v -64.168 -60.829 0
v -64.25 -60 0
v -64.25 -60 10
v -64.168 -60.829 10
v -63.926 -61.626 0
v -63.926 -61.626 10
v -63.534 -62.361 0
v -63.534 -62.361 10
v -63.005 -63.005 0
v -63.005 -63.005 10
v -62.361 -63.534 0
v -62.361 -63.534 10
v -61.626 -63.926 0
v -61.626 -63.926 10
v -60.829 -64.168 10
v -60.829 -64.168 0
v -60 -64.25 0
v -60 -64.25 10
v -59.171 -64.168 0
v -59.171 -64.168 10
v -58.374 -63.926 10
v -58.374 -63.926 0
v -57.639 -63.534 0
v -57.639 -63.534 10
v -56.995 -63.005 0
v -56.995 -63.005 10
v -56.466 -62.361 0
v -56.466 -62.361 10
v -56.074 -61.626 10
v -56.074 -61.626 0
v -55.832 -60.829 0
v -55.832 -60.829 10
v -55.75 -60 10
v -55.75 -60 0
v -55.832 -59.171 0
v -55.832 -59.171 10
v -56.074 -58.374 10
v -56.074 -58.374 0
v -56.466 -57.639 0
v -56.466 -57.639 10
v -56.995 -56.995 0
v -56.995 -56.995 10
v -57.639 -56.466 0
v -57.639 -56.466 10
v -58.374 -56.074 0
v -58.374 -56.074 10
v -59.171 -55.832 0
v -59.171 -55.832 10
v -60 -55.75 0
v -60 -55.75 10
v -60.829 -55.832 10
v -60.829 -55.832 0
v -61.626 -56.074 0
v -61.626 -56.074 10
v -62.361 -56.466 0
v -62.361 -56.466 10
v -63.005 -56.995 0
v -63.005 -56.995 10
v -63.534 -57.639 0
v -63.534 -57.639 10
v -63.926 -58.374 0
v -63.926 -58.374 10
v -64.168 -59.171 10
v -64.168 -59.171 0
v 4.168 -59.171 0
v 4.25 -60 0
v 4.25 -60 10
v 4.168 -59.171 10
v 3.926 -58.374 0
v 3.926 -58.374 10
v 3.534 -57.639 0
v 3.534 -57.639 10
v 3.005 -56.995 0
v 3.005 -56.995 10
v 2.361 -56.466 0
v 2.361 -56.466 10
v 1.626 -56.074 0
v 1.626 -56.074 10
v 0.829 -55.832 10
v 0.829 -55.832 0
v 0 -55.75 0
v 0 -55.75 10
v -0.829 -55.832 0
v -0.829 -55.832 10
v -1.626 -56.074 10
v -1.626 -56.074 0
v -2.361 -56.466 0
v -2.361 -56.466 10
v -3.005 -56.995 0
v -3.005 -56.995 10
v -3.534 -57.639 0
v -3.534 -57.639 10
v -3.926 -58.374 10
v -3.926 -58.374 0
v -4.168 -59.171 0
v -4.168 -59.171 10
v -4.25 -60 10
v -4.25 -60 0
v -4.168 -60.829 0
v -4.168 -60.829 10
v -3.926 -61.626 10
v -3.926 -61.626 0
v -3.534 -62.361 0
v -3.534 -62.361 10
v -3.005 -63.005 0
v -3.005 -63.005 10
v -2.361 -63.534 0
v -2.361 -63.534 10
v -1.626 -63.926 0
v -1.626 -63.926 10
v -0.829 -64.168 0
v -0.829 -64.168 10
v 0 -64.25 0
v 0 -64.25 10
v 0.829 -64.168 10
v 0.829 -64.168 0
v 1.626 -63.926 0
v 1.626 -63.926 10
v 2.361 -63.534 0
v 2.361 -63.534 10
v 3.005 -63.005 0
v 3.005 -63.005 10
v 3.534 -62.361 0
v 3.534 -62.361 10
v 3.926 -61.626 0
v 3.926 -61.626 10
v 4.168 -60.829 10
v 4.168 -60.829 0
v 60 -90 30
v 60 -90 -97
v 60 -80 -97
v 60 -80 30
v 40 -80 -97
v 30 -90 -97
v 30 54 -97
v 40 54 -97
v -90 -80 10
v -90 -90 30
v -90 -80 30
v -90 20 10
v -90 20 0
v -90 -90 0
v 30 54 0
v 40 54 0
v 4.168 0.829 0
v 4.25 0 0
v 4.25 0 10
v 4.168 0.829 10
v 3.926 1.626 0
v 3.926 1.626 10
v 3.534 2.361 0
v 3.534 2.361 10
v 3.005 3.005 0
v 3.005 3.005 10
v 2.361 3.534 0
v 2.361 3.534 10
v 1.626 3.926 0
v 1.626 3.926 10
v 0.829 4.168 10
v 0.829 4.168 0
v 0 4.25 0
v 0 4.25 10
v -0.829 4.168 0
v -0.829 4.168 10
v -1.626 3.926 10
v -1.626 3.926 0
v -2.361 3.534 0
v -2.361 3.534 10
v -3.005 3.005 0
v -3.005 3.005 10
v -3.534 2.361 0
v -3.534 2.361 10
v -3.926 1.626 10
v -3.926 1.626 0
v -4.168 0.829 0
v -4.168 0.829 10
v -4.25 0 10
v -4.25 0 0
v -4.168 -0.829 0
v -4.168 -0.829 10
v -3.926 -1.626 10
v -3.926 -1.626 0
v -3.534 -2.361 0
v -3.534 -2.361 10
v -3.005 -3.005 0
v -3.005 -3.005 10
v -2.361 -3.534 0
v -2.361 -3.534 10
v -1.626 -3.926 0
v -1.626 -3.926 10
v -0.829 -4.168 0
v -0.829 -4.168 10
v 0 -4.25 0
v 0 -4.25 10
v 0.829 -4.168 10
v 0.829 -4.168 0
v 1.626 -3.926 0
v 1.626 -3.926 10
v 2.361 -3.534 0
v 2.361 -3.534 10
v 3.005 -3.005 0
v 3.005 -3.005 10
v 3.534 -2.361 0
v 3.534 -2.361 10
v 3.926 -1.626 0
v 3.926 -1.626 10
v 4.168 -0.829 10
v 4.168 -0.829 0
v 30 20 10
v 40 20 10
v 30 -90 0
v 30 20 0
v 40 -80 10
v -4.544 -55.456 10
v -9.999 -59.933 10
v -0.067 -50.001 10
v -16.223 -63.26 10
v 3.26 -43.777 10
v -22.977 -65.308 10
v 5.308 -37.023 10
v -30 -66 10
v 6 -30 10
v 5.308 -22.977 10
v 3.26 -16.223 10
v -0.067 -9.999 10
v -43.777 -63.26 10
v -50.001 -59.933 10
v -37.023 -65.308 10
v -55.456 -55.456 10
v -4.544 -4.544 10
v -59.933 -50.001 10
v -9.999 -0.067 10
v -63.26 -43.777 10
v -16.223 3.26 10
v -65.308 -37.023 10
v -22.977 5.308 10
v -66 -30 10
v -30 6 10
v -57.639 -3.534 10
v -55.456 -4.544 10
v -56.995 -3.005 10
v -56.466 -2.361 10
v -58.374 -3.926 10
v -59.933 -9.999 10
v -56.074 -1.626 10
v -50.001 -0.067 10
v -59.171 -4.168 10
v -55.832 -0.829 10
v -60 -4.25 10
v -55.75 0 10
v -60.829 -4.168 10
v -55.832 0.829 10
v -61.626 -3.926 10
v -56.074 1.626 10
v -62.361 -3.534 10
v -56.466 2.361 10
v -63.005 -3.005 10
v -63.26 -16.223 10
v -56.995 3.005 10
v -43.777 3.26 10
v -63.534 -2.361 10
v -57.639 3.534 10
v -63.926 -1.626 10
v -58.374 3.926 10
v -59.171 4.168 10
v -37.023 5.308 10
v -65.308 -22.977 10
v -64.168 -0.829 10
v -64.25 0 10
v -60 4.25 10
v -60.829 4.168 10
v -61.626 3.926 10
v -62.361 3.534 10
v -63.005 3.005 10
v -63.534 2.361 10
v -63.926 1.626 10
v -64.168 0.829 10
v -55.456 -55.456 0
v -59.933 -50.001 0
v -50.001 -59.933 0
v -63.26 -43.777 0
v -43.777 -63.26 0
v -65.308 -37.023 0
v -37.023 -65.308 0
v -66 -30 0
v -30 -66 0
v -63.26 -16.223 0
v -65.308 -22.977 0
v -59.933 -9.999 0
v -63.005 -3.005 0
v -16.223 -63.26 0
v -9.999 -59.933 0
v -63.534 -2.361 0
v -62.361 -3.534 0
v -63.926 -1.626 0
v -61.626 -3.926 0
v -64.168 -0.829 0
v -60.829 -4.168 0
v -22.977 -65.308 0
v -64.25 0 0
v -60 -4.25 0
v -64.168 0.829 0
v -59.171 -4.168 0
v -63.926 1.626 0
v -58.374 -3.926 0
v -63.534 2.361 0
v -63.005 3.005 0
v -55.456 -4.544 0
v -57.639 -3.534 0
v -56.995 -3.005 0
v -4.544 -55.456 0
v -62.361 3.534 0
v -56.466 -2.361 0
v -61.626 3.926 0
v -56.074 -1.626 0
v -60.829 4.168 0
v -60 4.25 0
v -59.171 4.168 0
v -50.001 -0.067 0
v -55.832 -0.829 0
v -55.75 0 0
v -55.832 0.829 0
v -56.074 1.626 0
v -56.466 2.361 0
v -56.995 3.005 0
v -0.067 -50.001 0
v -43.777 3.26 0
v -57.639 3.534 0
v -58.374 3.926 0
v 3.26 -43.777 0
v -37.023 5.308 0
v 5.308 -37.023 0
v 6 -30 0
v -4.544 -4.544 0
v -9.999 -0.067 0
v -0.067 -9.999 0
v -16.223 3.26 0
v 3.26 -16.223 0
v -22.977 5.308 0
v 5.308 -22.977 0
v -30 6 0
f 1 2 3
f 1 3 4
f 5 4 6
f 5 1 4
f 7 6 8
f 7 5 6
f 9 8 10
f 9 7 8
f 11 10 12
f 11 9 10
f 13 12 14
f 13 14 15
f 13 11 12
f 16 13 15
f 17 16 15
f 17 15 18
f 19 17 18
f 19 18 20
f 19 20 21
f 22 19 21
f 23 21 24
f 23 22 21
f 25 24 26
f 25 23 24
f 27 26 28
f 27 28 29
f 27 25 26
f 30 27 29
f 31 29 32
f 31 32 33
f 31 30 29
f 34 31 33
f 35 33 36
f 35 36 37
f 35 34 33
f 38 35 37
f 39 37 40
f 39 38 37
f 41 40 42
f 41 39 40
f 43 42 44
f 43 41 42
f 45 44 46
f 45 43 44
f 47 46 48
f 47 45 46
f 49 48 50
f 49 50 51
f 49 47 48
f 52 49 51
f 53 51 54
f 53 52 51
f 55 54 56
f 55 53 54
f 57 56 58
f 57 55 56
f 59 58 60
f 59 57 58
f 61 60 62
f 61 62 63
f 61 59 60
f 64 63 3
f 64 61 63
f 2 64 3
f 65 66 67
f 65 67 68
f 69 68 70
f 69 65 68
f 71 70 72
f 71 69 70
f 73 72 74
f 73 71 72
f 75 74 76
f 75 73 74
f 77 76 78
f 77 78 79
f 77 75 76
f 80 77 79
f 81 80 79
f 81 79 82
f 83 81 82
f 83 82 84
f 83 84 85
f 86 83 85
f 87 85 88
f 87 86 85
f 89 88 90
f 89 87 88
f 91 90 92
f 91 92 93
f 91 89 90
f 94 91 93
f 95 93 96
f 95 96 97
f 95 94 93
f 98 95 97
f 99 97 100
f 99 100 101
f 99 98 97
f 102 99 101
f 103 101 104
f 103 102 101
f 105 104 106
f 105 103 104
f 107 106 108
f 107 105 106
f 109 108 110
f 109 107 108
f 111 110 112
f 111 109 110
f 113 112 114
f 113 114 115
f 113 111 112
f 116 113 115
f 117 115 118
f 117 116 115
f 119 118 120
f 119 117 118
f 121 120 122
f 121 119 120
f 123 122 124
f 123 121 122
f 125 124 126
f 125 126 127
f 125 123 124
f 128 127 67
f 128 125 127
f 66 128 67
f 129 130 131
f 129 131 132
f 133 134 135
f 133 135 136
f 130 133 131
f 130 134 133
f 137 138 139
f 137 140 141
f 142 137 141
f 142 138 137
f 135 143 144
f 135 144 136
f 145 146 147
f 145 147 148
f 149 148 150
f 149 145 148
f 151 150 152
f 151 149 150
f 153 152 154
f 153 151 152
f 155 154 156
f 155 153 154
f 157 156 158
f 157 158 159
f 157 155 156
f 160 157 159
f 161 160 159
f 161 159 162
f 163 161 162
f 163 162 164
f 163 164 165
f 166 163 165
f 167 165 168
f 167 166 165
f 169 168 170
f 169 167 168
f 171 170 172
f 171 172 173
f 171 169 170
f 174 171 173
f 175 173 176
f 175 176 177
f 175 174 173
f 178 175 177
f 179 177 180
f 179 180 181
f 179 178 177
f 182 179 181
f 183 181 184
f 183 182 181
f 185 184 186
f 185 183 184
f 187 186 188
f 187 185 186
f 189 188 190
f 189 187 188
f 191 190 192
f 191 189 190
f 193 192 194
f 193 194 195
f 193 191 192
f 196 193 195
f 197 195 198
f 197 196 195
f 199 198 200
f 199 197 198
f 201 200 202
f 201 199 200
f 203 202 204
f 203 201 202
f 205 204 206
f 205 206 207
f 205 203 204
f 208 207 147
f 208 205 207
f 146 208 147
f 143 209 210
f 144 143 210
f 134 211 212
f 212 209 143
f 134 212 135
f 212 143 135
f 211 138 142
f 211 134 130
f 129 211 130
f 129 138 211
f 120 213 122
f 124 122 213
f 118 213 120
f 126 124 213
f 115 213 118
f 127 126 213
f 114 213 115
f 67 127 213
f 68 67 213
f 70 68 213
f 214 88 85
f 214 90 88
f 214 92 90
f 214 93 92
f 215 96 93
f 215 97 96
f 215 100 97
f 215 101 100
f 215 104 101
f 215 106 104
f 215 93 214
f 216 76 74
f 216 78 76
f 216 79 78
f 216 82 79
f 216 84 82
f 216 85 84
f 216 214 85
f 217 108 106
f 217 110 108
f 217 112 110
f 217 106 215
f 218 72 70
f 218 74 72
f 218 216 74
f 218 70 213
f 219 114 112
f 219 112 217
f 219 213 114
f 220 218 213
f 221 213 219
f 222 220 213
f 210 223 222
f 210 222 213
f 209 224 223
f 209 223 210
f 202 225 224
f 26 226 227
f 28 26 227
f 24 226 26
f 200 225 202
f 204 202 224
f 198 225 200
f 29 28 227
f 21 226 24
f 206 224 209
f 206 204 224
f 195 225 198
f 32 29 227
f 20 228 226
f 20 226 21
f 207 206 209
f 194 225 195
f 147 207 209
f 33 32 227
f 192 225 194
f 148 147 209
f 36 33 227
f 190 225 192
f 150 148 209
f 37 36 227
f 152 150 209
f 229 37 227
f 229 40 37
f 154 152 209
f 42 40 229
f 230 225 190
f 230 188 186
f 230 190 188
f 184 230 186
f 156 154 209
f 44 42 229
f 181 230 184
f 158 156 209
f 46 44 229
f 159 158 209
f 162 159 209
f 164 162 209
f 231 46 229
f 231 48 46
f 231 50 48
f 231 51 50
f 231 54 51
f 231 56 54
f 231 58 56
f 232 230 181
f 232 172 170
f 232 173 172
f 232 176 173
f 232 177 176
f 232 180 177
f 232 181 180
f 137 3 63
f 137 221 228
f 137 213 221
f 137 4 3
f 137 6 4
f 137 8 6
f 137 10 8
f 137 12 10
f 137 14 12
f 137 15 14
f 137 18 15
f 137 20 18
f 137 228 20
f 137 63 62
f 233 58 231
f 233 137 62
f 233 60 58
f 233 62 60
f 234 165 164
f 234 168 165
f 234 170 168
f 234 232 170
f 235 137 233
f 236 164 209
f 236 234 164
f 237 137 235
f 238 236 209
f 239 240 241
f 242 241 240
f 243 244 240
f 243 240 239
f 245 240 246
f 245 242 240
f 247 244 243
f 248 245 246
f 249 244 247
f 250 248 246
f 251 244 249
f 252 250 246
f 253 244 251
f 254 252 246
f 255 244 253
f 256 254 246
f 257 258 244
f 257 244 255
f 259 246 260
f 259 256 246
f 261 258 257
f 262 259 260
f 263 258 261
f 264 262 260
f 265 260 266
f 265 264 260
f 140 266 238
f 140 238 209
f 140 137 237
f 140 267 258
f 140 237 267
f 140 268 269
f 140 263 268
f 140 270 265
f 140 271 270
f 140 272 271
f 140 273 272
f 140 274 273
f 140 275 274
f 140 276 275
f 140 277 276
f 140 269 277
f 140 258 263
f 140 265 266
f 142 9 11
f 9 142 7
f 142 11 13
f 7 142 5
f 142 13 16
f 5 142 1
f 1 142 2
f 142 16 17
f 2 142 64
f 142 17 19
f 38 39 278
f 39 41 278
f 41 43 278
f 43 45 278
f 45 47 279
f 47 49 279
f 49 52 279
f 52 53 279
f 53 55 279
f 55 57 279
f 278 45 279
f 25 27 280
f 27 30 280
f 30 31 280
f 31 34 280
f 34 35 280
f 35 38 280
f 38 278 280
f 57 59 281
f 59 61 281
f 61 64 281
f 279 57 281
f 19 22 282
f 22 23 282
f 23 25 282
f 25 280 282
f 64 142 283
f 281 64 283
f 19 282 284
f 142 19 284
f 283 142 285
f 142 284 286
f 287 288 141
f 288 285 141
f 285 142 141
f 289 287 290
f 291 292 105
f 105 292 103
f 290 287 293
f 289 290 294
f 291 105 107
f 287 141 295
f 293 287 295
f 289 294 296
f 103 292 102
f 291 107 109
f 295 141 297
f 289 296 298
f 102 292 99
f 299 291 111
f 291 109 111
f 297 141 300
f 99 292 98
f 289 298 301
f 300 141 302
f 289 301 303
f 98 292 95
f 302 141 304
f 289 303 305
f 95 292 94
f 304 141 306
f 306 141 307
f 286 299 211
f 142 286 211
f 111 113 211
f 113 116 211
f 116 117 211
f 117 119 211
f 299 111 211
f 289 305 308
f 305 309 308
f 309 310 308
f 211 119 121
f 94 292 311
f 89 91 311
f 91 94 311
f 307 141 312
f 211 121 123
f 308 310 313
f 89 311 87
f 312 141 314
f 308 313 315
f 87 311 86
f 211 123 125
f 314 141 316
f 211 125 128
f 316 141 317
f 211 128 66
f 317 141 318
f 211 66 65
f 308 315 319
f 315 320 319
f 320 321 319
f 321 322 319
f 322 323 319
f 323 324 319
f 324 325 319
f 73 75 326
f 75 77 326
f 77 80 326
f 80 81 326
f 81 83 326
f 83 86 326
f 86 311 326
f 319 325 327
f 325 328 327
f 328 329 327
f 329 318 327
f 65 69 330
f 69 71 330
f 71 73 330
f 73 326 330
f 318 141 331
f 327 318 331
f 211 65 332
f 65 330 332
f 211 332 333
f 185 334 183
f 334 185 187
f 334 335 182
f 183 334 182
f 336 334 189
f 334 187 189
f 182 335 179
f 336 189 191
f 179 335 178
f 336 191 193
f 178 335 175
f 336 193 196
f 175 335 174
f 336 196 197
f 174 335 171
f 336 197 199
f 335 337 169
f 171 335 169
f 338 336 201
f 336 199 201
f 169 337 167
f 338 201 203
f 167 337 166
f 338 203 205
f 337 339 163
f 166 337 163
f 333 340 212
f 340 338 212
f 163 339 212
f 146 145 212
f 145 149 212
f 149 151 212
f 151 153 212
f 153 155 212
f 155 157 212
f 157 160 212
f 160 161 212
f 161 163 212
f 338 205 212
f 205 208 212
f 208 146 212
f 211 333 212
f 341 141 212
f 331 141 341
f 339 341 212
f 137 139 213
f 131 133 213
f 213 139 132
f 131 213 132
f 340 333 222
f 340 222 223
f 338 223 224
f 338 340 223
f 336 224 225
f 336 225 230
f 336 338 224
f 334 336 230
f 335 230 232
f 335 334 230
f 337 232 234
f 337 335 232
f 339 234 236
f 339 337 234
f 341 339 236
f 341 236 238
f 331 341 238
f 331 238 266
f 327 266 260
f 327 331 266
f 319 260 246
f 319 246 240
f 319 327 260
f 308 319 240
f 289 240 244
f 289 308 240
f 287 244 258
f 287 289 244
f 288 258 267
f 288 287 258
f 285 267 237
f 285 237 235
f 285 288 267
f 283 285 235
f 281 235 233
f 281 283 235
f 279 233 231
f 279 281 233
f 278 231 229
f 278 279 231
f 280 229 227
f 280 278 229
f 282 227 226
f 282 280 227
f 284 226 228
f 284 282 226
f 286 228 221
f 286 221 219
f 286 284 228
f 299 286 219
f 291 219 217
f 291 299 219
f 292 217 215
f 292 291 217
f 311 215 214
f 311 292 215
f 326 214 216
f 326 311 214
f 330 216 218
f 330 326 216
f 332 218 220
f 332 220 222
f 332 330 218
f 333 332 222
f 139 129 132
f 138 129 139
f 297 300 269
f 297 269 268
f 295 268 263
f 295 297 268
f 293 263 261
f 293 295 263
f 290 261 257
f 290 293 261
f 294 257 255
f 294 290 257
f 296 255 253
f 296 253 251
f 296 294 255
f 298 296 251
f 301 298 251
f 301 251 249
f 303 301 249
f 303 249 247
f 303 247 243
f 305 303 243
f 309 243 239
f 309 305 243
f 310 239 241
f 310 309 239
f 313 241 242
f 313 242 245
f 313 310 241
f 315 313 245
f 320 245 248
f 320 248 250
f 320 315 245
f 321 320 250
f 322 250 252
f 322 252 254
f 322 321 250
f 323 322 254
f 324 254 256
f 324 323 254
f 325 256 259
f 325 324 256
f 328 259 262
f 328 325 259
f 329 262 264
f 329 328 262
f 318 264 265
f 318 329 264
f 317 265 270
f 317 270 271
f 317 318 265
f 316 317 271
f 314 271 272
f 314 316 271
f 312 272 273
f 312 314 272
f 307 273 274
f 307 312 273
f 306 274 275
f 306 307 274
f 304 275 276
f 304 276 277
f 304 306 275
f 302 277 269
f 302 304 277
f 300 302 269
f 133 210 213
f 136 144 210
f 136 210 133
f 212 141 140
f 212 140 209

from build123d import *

# Parameters (mm, degrees)
SKETCH1_W           = 120
SKETCH1_H           = 110
SKETCH1_R           = 4.25
SKETCH1_R_2         = 36
BOSS_EXTRUDE1_DEPTH = 10
SKETCH2_W           = 107
SKETCH2_H           = 144
BOSS_EXTRUDE2_DEPTH = 10
CHAMFER1_SIZE       = 10
CHAMFER1_SIZE2      = 34
BOSS_EXTRUDE4_DEPTH = 10


with BuildPart() as part:
    # Sketch1 → Boss-Extrude1 (new body)
    with BuildSketch(Plane.XY):
        with Locations((-30, -35)):
            Rectangle(SKETCH1_W, SKETCH1_H)
        Circle(SKETCH1_R, mode=Mode.SUBTRACT)
        with Locations((0, -60)):
            Circle(SKETCH1_R, mode=Mode.SUBTRACT)
        with Locations((-30, -30)):
            Circle(SKETCH1_R_2, mode=Mode.SUBTRACT)
        with Locations(Location((-60, 0, 0), (0, 0, 180))):
            Circle(SKETCH1_R, mode=Mode.SUBTRACT)
        with Locations(Location((-60, -60, 0), (0, 0, 180))):
            Circle(SKETCH1_R, mode=Mode.SUBTRACT)
    extrude(amount=BOSS_EXTRUDE1_DEPTH)

    # Sketch2 → Boss-Extrude2 (add)
    with BuildSketch(Plane(origin=(30, 0, 0), x_dir=(0, 0, -1), z_dir=(1, 0, 0))):
        with Locations((43.5, -18)):
            Rectangle(SKETCH2_W, SKETCH2_H)
    extrude(amount=BOSS_EXTRUDE2_DEPTH)

    # Chamfer1
    chamfer1_edges = [part.edges().sort_by_distance(p)[0] for p in [
        (35, 54, 10),
    ]]
    chamfer1_side = [part.faces().sort_by_distance(p)[0] for p in [
        (35, 54, -43.5),
    ]]
    chamfer(chamfer1_edges, length=CHAMFER1_SIZE, length2=CHAMFER1_SIZE2, reference=chamfer1_side[0])

    # Sketch6 → Boss-Extrude4 (add)
    with BuildSketch(Plane.XZ.offset(90)):
        Polygon((-90, 30), (-90, 10), (40, 10), (40, -97), (60, -97), (60, 30), align=None)
    extrude(amount=-BOSS_EXTRUDE4_DEPTH)


solid = part.part
